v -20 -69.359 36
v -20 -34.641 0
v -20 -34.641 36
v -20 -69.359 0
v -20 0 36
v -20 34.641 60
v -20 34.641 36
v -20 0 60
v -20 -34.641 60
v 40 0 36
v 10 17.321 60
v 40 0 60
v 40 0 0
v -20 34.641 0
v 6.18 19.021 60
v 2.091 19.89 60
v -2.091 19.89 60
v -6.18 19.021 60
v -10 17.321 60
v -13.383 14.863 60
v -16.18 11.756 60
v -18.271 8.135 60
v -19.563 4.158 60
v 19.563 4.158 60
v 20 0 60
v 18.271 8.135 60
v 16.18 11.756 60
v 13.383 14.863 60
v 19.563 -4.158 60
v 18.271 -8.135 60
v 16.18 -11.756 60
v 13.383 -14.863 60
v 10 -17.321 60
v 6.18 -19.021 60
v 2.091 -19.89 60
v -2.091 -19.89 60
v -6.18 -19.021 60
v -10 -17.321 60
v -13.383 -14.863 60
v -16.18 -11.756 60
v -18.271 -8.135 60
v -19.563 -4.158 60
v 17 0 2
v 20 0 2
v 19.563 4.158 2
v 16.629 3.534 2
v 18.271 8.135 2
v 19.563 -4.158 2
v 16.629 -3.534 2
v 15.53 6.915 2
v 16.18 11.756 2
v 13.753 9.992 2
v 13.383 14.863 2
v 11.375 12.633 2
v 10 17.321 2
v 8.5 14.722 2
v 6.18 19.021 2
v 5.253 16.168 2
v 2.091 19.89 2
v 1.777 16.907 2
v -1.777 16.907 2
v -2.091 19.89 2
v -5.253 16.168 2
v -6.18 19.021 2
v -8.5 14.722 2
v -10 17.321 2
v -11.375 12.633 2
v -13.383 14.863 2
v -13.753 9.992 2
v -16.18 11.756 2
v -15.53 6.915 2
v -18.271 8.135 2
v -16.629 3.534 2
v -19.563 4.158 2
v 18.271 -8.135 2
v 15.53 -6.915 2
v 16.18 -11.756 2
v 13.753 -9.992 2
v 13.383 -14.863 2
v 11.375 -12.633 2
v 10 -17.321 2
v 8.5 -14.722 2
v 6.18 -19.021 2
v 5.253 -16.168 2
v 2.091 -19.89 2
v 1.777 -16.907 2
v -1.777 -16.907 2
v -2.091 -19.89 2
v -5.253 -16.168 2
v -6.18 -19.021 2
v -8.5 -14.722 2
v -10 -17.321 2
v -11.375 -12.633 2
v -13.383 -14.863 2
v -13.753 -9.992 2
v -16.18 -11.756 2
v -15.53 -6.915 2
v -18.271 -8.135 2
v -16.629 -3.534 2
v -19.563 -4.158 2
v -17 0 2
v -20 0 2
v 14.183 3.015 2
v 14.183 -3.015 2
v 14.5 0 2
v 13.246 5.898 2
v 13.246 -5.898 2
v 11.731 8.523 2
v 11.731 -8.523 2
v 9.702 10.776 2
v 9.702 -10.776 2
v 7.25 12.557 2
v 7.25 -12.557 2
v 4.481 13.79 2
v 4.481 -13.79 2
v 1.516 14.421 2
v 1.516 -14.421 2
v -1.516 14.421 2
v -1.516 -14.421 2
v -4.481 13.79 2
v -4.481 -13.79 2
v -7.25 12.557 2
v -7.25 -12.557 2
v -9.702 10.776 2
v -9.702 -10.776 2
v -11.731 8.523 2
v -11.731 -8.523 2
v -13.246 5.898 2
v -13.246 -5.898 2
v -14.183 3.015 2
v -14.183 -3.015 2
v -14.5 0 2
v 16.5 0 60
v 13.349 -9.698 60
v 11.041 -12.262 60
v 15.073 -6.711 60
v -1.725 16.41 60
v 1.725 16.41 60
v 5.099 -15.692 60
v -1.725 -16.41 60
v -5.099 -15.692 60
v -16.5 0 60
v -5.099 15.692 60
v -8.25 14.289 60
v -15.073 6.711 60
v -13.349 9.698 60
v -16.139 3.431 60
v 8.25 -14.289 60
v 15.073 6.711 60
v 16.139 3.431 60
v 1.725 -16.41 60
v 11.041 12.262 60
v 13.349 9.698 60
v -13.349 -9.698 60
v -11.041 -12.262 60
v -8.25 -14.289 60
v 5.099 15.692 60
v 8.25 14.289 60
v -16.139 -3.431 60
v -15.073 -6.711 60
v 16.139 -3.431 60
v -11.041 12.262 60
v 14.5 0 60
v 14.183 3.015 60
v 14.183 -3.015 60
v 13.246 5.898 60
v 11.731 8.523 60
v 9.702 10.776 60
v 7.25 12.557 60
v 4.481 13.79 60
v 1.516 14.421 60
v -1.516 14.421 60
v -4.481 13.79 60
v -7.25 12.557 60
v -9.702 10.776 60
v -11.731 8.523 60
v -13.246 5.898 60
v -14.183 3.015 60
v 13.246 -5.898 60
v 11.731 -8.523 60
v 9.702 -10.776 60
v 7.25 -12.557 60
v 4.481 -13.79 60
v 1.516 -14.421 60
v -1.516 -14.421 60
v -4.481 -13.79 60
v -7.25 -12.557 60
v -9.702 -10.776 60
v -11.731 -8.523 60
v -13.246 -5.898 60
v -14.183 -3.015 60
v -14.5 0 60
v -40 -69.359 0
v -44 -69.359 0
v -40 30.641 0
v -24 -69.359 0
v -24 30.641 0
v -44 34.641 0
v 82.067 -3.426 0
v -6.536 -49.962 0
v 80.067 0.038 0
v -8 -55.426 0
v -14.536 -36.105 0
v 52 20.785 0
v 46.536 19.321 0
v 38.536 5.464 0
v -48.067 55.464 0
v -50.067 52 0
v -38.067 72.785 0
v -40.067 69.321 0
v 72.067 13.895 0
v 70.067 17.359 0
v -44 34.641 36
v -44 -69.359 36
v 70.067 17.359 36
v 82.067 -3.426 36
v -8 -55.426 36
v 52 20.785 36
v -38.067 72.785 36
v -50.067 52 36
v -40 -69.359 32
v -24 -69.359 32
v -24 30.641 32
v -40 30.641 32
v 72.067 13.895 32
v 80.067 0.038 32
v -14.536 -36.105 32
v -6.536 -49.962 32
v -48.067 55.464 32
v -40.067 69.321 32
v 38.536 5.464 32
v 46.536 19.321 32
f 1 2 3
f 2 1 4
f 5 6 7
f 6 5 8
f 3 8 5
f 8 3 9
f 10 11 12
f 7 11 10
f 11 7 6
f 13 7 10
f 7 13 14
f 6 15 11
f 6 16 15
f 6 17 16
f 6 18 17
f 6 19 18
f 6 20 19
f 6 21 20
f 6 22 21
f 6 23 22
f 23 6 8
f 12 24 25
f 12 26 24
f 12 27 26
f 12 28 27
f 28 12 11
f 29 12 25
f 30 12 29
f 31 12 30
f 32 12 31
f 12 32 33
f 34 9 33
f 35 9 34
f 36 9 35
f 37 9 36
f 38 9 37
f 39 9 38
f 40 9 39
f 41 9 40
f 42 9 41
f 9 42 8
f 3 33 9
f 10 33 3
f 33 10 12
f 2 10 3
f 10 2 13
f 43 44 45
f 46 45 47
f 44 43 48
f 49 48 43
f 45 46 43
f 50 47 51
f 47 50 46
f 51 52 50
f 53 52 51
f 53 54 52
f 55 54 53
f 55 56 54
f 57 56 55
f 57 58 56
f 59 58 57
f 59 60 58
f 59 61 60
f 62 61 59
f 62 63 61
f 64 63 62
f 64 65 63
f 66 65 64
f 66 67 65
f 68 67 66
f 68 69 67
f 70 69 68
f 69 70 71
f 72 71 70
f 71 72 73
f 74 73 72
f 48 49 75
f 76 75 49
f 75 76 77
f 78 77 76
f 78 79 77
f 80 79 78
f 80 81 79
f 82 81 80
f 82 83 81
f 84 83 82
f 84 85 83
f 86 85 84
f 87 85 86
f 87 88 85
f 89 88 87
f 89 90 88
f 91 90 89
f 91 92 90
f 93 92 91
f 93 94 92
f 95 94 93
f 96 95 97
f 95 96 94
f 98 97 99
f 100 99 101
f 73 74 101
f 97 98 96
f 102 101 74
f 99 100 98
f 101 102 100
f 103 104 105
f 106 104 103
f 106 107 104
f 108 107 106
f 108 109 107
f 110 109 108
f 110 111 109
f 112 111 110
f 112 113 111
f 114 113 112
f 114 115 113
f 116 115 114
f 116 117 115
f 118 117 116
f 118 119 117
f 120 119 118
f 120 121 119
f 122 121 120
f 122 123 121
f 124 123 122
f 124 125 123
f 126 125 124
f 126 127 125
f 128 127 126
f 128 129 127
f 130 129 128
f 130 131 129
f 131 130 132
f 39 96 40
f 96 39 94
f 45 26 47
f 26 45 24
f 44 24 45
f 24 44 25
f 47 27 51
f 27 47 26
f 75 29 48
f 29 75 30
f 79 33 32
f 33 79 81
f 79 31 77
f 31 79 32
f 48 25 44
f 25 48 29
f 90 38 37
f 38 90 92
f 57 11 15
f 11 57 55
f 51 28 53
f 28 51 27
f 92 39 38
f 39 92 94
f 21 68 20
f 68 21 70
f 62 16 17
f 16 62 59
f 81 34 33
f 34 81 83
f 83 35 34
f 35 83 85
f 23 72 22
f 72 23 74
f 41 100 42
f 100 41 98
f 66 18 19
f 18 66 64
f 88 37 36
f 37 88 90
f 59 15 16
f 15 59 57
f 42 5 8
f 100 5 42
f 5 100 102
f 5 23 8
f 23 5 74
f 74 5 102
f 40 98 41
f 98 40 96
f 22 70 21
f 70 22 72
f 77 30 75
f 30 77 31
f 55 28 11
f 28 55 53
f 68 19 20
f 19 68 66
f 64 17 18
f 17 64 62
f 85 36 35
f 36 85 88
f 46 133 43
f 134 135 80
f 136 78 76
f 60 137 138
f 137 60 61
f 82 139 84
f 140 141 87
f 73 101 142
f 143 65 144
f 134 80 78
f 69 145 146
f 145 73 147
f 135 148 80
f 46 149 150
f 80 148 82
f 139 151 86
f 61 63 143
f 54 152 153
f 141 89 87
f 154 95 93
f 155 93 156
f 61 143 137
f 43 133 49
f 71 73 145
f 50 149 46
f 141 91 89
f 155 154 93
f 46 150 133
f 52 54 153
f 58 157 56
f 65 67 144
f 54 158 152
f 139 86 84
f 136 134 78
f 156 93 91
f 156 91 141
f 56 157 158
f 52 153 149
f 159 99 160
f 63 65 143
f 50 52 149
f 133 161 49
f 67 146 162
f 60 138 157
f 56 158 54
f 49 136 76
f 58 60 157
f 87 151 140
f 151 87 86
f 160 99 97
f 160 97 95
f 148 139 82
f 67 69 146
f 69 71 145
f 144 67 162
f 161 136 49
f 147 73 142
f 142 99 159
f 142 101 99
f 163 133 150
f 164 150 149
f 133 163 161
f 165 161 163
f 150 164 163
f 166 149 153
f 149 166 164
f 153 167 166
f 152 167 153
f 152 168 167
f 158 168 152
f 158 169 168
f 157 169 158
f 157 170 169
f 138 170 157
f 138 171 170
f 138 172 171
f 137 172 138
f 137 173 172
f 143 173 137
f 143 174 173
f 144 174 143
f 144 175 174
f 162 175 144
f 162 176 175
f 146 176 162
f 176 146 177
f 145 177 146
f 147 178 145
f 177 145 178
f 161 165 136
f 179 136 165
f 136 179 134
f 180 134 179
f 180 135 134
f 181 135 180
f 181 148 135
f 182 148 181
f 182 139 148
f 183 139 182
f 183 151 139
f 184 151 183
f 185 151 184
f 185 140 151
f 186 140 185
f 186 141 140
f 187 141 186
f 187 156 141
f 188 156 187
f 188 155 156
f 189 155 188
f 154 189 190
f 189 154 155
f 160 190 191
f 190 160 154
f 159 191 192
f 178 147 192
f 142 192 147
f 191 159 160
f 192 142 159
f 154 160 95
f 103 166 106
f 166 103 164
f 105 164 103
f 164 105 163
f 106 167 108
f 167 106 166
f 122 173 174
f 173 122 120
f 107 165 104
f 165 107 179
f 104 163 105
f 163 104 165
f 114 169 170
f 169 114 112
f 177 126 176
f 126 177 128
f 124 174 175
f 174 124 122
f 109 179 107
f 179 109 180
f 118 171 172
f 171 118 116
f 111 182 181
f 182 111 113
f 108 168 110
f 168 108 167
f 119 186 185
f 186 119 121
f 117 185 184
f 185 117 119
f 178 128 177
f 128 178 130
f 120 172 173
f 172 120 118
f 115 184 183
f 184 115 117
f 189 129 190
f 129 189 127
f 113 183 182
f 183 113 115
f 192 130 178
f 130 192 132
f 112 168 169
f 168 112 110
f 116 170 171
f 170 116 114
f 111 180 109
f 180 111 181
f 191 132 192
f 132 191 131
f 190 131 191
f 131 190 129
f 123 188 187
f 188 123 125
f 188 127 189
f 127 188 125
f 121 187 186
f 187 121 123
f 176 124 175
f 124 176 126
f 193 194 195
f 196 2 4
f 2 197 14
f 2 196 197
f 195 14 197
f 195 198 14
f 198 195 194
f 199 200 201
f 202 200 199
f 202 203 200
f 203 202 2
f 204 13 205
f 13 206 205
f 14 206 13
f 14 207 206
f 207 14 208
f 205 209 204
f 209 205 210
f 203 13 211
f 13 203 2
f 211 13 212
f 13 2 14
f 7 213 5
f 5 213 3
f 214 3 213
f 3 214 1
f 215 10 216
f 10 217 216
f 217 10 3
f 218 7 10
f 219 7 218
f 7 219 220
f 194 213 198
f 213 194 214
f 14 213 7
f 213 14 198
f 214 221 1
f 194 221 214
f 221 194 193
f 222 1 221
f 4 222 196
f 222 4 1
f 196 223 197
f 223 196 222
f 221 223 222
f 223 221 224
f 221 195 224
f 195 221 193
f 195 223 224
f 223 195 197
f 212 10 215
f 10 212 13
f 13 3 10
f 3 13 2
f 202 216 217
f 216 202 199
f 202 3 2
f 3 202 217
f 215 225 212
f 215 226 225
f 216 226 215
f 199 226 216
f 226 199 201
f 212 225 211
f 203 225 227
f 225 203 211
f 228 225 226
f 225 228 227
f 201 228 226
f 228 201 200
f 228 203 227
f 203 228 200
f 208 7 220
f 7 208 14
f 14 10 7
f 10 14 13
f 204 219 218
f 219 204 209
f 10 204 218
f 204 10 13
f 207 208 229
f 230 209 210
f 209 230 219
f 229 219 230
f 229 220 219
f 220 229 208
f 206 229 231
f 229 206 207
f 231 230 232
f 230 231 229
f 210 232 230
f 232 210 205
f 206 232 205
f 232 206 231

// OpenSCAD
paalDiamBuiten = 40;
paalDiamBinnen = 34;
height = 60;

balkH = 32;
balkD = 16;

fn=180;

module paalHouder() {
    union() {
        cylinder(d=paalDiamBuiten*2, h=2, $fn=3);
        translate([0,0,2]) {
            difference() {
                cylinder(d=paalDiamBuiten*2, h=height-2, $fn=3);
                cylinder(d=paalDiamBuiten, h=height-2);
            }
            difference() {
                cylinder(d1=paalDiamBinnen, d2=paalDiamBinnen-1, h=height-2);
                cylinder(d=paalDiamBinnen-5, h=height-2);
            }
        }
    }
}

module zijbalk() {
    w = 100;//paalDiamBuiten*2;
    wall = 4;
    e = paalDiamBuiten/(sqrt(3)/3);
    translate([-(paalDiamBuiten/2+(balkD+wall*2)),-(e/2+(w+wall-e)),0]) {
        difference() {
            cube([balkD+wall*2, w+wall, balkH+wall]);
            translate([wall,0,0]) 
                cube([balkD, w, balkH]);
        }
    }
}

module bodemKruis() {
    w = paalDiamBuiten * 2;
    h = 4;
    paalHouder();
}

bodemKruis();
zijbalk();
rotate([0,0,120])
    zijbalk();
rotate([0,0,240])
    zijbalk();
